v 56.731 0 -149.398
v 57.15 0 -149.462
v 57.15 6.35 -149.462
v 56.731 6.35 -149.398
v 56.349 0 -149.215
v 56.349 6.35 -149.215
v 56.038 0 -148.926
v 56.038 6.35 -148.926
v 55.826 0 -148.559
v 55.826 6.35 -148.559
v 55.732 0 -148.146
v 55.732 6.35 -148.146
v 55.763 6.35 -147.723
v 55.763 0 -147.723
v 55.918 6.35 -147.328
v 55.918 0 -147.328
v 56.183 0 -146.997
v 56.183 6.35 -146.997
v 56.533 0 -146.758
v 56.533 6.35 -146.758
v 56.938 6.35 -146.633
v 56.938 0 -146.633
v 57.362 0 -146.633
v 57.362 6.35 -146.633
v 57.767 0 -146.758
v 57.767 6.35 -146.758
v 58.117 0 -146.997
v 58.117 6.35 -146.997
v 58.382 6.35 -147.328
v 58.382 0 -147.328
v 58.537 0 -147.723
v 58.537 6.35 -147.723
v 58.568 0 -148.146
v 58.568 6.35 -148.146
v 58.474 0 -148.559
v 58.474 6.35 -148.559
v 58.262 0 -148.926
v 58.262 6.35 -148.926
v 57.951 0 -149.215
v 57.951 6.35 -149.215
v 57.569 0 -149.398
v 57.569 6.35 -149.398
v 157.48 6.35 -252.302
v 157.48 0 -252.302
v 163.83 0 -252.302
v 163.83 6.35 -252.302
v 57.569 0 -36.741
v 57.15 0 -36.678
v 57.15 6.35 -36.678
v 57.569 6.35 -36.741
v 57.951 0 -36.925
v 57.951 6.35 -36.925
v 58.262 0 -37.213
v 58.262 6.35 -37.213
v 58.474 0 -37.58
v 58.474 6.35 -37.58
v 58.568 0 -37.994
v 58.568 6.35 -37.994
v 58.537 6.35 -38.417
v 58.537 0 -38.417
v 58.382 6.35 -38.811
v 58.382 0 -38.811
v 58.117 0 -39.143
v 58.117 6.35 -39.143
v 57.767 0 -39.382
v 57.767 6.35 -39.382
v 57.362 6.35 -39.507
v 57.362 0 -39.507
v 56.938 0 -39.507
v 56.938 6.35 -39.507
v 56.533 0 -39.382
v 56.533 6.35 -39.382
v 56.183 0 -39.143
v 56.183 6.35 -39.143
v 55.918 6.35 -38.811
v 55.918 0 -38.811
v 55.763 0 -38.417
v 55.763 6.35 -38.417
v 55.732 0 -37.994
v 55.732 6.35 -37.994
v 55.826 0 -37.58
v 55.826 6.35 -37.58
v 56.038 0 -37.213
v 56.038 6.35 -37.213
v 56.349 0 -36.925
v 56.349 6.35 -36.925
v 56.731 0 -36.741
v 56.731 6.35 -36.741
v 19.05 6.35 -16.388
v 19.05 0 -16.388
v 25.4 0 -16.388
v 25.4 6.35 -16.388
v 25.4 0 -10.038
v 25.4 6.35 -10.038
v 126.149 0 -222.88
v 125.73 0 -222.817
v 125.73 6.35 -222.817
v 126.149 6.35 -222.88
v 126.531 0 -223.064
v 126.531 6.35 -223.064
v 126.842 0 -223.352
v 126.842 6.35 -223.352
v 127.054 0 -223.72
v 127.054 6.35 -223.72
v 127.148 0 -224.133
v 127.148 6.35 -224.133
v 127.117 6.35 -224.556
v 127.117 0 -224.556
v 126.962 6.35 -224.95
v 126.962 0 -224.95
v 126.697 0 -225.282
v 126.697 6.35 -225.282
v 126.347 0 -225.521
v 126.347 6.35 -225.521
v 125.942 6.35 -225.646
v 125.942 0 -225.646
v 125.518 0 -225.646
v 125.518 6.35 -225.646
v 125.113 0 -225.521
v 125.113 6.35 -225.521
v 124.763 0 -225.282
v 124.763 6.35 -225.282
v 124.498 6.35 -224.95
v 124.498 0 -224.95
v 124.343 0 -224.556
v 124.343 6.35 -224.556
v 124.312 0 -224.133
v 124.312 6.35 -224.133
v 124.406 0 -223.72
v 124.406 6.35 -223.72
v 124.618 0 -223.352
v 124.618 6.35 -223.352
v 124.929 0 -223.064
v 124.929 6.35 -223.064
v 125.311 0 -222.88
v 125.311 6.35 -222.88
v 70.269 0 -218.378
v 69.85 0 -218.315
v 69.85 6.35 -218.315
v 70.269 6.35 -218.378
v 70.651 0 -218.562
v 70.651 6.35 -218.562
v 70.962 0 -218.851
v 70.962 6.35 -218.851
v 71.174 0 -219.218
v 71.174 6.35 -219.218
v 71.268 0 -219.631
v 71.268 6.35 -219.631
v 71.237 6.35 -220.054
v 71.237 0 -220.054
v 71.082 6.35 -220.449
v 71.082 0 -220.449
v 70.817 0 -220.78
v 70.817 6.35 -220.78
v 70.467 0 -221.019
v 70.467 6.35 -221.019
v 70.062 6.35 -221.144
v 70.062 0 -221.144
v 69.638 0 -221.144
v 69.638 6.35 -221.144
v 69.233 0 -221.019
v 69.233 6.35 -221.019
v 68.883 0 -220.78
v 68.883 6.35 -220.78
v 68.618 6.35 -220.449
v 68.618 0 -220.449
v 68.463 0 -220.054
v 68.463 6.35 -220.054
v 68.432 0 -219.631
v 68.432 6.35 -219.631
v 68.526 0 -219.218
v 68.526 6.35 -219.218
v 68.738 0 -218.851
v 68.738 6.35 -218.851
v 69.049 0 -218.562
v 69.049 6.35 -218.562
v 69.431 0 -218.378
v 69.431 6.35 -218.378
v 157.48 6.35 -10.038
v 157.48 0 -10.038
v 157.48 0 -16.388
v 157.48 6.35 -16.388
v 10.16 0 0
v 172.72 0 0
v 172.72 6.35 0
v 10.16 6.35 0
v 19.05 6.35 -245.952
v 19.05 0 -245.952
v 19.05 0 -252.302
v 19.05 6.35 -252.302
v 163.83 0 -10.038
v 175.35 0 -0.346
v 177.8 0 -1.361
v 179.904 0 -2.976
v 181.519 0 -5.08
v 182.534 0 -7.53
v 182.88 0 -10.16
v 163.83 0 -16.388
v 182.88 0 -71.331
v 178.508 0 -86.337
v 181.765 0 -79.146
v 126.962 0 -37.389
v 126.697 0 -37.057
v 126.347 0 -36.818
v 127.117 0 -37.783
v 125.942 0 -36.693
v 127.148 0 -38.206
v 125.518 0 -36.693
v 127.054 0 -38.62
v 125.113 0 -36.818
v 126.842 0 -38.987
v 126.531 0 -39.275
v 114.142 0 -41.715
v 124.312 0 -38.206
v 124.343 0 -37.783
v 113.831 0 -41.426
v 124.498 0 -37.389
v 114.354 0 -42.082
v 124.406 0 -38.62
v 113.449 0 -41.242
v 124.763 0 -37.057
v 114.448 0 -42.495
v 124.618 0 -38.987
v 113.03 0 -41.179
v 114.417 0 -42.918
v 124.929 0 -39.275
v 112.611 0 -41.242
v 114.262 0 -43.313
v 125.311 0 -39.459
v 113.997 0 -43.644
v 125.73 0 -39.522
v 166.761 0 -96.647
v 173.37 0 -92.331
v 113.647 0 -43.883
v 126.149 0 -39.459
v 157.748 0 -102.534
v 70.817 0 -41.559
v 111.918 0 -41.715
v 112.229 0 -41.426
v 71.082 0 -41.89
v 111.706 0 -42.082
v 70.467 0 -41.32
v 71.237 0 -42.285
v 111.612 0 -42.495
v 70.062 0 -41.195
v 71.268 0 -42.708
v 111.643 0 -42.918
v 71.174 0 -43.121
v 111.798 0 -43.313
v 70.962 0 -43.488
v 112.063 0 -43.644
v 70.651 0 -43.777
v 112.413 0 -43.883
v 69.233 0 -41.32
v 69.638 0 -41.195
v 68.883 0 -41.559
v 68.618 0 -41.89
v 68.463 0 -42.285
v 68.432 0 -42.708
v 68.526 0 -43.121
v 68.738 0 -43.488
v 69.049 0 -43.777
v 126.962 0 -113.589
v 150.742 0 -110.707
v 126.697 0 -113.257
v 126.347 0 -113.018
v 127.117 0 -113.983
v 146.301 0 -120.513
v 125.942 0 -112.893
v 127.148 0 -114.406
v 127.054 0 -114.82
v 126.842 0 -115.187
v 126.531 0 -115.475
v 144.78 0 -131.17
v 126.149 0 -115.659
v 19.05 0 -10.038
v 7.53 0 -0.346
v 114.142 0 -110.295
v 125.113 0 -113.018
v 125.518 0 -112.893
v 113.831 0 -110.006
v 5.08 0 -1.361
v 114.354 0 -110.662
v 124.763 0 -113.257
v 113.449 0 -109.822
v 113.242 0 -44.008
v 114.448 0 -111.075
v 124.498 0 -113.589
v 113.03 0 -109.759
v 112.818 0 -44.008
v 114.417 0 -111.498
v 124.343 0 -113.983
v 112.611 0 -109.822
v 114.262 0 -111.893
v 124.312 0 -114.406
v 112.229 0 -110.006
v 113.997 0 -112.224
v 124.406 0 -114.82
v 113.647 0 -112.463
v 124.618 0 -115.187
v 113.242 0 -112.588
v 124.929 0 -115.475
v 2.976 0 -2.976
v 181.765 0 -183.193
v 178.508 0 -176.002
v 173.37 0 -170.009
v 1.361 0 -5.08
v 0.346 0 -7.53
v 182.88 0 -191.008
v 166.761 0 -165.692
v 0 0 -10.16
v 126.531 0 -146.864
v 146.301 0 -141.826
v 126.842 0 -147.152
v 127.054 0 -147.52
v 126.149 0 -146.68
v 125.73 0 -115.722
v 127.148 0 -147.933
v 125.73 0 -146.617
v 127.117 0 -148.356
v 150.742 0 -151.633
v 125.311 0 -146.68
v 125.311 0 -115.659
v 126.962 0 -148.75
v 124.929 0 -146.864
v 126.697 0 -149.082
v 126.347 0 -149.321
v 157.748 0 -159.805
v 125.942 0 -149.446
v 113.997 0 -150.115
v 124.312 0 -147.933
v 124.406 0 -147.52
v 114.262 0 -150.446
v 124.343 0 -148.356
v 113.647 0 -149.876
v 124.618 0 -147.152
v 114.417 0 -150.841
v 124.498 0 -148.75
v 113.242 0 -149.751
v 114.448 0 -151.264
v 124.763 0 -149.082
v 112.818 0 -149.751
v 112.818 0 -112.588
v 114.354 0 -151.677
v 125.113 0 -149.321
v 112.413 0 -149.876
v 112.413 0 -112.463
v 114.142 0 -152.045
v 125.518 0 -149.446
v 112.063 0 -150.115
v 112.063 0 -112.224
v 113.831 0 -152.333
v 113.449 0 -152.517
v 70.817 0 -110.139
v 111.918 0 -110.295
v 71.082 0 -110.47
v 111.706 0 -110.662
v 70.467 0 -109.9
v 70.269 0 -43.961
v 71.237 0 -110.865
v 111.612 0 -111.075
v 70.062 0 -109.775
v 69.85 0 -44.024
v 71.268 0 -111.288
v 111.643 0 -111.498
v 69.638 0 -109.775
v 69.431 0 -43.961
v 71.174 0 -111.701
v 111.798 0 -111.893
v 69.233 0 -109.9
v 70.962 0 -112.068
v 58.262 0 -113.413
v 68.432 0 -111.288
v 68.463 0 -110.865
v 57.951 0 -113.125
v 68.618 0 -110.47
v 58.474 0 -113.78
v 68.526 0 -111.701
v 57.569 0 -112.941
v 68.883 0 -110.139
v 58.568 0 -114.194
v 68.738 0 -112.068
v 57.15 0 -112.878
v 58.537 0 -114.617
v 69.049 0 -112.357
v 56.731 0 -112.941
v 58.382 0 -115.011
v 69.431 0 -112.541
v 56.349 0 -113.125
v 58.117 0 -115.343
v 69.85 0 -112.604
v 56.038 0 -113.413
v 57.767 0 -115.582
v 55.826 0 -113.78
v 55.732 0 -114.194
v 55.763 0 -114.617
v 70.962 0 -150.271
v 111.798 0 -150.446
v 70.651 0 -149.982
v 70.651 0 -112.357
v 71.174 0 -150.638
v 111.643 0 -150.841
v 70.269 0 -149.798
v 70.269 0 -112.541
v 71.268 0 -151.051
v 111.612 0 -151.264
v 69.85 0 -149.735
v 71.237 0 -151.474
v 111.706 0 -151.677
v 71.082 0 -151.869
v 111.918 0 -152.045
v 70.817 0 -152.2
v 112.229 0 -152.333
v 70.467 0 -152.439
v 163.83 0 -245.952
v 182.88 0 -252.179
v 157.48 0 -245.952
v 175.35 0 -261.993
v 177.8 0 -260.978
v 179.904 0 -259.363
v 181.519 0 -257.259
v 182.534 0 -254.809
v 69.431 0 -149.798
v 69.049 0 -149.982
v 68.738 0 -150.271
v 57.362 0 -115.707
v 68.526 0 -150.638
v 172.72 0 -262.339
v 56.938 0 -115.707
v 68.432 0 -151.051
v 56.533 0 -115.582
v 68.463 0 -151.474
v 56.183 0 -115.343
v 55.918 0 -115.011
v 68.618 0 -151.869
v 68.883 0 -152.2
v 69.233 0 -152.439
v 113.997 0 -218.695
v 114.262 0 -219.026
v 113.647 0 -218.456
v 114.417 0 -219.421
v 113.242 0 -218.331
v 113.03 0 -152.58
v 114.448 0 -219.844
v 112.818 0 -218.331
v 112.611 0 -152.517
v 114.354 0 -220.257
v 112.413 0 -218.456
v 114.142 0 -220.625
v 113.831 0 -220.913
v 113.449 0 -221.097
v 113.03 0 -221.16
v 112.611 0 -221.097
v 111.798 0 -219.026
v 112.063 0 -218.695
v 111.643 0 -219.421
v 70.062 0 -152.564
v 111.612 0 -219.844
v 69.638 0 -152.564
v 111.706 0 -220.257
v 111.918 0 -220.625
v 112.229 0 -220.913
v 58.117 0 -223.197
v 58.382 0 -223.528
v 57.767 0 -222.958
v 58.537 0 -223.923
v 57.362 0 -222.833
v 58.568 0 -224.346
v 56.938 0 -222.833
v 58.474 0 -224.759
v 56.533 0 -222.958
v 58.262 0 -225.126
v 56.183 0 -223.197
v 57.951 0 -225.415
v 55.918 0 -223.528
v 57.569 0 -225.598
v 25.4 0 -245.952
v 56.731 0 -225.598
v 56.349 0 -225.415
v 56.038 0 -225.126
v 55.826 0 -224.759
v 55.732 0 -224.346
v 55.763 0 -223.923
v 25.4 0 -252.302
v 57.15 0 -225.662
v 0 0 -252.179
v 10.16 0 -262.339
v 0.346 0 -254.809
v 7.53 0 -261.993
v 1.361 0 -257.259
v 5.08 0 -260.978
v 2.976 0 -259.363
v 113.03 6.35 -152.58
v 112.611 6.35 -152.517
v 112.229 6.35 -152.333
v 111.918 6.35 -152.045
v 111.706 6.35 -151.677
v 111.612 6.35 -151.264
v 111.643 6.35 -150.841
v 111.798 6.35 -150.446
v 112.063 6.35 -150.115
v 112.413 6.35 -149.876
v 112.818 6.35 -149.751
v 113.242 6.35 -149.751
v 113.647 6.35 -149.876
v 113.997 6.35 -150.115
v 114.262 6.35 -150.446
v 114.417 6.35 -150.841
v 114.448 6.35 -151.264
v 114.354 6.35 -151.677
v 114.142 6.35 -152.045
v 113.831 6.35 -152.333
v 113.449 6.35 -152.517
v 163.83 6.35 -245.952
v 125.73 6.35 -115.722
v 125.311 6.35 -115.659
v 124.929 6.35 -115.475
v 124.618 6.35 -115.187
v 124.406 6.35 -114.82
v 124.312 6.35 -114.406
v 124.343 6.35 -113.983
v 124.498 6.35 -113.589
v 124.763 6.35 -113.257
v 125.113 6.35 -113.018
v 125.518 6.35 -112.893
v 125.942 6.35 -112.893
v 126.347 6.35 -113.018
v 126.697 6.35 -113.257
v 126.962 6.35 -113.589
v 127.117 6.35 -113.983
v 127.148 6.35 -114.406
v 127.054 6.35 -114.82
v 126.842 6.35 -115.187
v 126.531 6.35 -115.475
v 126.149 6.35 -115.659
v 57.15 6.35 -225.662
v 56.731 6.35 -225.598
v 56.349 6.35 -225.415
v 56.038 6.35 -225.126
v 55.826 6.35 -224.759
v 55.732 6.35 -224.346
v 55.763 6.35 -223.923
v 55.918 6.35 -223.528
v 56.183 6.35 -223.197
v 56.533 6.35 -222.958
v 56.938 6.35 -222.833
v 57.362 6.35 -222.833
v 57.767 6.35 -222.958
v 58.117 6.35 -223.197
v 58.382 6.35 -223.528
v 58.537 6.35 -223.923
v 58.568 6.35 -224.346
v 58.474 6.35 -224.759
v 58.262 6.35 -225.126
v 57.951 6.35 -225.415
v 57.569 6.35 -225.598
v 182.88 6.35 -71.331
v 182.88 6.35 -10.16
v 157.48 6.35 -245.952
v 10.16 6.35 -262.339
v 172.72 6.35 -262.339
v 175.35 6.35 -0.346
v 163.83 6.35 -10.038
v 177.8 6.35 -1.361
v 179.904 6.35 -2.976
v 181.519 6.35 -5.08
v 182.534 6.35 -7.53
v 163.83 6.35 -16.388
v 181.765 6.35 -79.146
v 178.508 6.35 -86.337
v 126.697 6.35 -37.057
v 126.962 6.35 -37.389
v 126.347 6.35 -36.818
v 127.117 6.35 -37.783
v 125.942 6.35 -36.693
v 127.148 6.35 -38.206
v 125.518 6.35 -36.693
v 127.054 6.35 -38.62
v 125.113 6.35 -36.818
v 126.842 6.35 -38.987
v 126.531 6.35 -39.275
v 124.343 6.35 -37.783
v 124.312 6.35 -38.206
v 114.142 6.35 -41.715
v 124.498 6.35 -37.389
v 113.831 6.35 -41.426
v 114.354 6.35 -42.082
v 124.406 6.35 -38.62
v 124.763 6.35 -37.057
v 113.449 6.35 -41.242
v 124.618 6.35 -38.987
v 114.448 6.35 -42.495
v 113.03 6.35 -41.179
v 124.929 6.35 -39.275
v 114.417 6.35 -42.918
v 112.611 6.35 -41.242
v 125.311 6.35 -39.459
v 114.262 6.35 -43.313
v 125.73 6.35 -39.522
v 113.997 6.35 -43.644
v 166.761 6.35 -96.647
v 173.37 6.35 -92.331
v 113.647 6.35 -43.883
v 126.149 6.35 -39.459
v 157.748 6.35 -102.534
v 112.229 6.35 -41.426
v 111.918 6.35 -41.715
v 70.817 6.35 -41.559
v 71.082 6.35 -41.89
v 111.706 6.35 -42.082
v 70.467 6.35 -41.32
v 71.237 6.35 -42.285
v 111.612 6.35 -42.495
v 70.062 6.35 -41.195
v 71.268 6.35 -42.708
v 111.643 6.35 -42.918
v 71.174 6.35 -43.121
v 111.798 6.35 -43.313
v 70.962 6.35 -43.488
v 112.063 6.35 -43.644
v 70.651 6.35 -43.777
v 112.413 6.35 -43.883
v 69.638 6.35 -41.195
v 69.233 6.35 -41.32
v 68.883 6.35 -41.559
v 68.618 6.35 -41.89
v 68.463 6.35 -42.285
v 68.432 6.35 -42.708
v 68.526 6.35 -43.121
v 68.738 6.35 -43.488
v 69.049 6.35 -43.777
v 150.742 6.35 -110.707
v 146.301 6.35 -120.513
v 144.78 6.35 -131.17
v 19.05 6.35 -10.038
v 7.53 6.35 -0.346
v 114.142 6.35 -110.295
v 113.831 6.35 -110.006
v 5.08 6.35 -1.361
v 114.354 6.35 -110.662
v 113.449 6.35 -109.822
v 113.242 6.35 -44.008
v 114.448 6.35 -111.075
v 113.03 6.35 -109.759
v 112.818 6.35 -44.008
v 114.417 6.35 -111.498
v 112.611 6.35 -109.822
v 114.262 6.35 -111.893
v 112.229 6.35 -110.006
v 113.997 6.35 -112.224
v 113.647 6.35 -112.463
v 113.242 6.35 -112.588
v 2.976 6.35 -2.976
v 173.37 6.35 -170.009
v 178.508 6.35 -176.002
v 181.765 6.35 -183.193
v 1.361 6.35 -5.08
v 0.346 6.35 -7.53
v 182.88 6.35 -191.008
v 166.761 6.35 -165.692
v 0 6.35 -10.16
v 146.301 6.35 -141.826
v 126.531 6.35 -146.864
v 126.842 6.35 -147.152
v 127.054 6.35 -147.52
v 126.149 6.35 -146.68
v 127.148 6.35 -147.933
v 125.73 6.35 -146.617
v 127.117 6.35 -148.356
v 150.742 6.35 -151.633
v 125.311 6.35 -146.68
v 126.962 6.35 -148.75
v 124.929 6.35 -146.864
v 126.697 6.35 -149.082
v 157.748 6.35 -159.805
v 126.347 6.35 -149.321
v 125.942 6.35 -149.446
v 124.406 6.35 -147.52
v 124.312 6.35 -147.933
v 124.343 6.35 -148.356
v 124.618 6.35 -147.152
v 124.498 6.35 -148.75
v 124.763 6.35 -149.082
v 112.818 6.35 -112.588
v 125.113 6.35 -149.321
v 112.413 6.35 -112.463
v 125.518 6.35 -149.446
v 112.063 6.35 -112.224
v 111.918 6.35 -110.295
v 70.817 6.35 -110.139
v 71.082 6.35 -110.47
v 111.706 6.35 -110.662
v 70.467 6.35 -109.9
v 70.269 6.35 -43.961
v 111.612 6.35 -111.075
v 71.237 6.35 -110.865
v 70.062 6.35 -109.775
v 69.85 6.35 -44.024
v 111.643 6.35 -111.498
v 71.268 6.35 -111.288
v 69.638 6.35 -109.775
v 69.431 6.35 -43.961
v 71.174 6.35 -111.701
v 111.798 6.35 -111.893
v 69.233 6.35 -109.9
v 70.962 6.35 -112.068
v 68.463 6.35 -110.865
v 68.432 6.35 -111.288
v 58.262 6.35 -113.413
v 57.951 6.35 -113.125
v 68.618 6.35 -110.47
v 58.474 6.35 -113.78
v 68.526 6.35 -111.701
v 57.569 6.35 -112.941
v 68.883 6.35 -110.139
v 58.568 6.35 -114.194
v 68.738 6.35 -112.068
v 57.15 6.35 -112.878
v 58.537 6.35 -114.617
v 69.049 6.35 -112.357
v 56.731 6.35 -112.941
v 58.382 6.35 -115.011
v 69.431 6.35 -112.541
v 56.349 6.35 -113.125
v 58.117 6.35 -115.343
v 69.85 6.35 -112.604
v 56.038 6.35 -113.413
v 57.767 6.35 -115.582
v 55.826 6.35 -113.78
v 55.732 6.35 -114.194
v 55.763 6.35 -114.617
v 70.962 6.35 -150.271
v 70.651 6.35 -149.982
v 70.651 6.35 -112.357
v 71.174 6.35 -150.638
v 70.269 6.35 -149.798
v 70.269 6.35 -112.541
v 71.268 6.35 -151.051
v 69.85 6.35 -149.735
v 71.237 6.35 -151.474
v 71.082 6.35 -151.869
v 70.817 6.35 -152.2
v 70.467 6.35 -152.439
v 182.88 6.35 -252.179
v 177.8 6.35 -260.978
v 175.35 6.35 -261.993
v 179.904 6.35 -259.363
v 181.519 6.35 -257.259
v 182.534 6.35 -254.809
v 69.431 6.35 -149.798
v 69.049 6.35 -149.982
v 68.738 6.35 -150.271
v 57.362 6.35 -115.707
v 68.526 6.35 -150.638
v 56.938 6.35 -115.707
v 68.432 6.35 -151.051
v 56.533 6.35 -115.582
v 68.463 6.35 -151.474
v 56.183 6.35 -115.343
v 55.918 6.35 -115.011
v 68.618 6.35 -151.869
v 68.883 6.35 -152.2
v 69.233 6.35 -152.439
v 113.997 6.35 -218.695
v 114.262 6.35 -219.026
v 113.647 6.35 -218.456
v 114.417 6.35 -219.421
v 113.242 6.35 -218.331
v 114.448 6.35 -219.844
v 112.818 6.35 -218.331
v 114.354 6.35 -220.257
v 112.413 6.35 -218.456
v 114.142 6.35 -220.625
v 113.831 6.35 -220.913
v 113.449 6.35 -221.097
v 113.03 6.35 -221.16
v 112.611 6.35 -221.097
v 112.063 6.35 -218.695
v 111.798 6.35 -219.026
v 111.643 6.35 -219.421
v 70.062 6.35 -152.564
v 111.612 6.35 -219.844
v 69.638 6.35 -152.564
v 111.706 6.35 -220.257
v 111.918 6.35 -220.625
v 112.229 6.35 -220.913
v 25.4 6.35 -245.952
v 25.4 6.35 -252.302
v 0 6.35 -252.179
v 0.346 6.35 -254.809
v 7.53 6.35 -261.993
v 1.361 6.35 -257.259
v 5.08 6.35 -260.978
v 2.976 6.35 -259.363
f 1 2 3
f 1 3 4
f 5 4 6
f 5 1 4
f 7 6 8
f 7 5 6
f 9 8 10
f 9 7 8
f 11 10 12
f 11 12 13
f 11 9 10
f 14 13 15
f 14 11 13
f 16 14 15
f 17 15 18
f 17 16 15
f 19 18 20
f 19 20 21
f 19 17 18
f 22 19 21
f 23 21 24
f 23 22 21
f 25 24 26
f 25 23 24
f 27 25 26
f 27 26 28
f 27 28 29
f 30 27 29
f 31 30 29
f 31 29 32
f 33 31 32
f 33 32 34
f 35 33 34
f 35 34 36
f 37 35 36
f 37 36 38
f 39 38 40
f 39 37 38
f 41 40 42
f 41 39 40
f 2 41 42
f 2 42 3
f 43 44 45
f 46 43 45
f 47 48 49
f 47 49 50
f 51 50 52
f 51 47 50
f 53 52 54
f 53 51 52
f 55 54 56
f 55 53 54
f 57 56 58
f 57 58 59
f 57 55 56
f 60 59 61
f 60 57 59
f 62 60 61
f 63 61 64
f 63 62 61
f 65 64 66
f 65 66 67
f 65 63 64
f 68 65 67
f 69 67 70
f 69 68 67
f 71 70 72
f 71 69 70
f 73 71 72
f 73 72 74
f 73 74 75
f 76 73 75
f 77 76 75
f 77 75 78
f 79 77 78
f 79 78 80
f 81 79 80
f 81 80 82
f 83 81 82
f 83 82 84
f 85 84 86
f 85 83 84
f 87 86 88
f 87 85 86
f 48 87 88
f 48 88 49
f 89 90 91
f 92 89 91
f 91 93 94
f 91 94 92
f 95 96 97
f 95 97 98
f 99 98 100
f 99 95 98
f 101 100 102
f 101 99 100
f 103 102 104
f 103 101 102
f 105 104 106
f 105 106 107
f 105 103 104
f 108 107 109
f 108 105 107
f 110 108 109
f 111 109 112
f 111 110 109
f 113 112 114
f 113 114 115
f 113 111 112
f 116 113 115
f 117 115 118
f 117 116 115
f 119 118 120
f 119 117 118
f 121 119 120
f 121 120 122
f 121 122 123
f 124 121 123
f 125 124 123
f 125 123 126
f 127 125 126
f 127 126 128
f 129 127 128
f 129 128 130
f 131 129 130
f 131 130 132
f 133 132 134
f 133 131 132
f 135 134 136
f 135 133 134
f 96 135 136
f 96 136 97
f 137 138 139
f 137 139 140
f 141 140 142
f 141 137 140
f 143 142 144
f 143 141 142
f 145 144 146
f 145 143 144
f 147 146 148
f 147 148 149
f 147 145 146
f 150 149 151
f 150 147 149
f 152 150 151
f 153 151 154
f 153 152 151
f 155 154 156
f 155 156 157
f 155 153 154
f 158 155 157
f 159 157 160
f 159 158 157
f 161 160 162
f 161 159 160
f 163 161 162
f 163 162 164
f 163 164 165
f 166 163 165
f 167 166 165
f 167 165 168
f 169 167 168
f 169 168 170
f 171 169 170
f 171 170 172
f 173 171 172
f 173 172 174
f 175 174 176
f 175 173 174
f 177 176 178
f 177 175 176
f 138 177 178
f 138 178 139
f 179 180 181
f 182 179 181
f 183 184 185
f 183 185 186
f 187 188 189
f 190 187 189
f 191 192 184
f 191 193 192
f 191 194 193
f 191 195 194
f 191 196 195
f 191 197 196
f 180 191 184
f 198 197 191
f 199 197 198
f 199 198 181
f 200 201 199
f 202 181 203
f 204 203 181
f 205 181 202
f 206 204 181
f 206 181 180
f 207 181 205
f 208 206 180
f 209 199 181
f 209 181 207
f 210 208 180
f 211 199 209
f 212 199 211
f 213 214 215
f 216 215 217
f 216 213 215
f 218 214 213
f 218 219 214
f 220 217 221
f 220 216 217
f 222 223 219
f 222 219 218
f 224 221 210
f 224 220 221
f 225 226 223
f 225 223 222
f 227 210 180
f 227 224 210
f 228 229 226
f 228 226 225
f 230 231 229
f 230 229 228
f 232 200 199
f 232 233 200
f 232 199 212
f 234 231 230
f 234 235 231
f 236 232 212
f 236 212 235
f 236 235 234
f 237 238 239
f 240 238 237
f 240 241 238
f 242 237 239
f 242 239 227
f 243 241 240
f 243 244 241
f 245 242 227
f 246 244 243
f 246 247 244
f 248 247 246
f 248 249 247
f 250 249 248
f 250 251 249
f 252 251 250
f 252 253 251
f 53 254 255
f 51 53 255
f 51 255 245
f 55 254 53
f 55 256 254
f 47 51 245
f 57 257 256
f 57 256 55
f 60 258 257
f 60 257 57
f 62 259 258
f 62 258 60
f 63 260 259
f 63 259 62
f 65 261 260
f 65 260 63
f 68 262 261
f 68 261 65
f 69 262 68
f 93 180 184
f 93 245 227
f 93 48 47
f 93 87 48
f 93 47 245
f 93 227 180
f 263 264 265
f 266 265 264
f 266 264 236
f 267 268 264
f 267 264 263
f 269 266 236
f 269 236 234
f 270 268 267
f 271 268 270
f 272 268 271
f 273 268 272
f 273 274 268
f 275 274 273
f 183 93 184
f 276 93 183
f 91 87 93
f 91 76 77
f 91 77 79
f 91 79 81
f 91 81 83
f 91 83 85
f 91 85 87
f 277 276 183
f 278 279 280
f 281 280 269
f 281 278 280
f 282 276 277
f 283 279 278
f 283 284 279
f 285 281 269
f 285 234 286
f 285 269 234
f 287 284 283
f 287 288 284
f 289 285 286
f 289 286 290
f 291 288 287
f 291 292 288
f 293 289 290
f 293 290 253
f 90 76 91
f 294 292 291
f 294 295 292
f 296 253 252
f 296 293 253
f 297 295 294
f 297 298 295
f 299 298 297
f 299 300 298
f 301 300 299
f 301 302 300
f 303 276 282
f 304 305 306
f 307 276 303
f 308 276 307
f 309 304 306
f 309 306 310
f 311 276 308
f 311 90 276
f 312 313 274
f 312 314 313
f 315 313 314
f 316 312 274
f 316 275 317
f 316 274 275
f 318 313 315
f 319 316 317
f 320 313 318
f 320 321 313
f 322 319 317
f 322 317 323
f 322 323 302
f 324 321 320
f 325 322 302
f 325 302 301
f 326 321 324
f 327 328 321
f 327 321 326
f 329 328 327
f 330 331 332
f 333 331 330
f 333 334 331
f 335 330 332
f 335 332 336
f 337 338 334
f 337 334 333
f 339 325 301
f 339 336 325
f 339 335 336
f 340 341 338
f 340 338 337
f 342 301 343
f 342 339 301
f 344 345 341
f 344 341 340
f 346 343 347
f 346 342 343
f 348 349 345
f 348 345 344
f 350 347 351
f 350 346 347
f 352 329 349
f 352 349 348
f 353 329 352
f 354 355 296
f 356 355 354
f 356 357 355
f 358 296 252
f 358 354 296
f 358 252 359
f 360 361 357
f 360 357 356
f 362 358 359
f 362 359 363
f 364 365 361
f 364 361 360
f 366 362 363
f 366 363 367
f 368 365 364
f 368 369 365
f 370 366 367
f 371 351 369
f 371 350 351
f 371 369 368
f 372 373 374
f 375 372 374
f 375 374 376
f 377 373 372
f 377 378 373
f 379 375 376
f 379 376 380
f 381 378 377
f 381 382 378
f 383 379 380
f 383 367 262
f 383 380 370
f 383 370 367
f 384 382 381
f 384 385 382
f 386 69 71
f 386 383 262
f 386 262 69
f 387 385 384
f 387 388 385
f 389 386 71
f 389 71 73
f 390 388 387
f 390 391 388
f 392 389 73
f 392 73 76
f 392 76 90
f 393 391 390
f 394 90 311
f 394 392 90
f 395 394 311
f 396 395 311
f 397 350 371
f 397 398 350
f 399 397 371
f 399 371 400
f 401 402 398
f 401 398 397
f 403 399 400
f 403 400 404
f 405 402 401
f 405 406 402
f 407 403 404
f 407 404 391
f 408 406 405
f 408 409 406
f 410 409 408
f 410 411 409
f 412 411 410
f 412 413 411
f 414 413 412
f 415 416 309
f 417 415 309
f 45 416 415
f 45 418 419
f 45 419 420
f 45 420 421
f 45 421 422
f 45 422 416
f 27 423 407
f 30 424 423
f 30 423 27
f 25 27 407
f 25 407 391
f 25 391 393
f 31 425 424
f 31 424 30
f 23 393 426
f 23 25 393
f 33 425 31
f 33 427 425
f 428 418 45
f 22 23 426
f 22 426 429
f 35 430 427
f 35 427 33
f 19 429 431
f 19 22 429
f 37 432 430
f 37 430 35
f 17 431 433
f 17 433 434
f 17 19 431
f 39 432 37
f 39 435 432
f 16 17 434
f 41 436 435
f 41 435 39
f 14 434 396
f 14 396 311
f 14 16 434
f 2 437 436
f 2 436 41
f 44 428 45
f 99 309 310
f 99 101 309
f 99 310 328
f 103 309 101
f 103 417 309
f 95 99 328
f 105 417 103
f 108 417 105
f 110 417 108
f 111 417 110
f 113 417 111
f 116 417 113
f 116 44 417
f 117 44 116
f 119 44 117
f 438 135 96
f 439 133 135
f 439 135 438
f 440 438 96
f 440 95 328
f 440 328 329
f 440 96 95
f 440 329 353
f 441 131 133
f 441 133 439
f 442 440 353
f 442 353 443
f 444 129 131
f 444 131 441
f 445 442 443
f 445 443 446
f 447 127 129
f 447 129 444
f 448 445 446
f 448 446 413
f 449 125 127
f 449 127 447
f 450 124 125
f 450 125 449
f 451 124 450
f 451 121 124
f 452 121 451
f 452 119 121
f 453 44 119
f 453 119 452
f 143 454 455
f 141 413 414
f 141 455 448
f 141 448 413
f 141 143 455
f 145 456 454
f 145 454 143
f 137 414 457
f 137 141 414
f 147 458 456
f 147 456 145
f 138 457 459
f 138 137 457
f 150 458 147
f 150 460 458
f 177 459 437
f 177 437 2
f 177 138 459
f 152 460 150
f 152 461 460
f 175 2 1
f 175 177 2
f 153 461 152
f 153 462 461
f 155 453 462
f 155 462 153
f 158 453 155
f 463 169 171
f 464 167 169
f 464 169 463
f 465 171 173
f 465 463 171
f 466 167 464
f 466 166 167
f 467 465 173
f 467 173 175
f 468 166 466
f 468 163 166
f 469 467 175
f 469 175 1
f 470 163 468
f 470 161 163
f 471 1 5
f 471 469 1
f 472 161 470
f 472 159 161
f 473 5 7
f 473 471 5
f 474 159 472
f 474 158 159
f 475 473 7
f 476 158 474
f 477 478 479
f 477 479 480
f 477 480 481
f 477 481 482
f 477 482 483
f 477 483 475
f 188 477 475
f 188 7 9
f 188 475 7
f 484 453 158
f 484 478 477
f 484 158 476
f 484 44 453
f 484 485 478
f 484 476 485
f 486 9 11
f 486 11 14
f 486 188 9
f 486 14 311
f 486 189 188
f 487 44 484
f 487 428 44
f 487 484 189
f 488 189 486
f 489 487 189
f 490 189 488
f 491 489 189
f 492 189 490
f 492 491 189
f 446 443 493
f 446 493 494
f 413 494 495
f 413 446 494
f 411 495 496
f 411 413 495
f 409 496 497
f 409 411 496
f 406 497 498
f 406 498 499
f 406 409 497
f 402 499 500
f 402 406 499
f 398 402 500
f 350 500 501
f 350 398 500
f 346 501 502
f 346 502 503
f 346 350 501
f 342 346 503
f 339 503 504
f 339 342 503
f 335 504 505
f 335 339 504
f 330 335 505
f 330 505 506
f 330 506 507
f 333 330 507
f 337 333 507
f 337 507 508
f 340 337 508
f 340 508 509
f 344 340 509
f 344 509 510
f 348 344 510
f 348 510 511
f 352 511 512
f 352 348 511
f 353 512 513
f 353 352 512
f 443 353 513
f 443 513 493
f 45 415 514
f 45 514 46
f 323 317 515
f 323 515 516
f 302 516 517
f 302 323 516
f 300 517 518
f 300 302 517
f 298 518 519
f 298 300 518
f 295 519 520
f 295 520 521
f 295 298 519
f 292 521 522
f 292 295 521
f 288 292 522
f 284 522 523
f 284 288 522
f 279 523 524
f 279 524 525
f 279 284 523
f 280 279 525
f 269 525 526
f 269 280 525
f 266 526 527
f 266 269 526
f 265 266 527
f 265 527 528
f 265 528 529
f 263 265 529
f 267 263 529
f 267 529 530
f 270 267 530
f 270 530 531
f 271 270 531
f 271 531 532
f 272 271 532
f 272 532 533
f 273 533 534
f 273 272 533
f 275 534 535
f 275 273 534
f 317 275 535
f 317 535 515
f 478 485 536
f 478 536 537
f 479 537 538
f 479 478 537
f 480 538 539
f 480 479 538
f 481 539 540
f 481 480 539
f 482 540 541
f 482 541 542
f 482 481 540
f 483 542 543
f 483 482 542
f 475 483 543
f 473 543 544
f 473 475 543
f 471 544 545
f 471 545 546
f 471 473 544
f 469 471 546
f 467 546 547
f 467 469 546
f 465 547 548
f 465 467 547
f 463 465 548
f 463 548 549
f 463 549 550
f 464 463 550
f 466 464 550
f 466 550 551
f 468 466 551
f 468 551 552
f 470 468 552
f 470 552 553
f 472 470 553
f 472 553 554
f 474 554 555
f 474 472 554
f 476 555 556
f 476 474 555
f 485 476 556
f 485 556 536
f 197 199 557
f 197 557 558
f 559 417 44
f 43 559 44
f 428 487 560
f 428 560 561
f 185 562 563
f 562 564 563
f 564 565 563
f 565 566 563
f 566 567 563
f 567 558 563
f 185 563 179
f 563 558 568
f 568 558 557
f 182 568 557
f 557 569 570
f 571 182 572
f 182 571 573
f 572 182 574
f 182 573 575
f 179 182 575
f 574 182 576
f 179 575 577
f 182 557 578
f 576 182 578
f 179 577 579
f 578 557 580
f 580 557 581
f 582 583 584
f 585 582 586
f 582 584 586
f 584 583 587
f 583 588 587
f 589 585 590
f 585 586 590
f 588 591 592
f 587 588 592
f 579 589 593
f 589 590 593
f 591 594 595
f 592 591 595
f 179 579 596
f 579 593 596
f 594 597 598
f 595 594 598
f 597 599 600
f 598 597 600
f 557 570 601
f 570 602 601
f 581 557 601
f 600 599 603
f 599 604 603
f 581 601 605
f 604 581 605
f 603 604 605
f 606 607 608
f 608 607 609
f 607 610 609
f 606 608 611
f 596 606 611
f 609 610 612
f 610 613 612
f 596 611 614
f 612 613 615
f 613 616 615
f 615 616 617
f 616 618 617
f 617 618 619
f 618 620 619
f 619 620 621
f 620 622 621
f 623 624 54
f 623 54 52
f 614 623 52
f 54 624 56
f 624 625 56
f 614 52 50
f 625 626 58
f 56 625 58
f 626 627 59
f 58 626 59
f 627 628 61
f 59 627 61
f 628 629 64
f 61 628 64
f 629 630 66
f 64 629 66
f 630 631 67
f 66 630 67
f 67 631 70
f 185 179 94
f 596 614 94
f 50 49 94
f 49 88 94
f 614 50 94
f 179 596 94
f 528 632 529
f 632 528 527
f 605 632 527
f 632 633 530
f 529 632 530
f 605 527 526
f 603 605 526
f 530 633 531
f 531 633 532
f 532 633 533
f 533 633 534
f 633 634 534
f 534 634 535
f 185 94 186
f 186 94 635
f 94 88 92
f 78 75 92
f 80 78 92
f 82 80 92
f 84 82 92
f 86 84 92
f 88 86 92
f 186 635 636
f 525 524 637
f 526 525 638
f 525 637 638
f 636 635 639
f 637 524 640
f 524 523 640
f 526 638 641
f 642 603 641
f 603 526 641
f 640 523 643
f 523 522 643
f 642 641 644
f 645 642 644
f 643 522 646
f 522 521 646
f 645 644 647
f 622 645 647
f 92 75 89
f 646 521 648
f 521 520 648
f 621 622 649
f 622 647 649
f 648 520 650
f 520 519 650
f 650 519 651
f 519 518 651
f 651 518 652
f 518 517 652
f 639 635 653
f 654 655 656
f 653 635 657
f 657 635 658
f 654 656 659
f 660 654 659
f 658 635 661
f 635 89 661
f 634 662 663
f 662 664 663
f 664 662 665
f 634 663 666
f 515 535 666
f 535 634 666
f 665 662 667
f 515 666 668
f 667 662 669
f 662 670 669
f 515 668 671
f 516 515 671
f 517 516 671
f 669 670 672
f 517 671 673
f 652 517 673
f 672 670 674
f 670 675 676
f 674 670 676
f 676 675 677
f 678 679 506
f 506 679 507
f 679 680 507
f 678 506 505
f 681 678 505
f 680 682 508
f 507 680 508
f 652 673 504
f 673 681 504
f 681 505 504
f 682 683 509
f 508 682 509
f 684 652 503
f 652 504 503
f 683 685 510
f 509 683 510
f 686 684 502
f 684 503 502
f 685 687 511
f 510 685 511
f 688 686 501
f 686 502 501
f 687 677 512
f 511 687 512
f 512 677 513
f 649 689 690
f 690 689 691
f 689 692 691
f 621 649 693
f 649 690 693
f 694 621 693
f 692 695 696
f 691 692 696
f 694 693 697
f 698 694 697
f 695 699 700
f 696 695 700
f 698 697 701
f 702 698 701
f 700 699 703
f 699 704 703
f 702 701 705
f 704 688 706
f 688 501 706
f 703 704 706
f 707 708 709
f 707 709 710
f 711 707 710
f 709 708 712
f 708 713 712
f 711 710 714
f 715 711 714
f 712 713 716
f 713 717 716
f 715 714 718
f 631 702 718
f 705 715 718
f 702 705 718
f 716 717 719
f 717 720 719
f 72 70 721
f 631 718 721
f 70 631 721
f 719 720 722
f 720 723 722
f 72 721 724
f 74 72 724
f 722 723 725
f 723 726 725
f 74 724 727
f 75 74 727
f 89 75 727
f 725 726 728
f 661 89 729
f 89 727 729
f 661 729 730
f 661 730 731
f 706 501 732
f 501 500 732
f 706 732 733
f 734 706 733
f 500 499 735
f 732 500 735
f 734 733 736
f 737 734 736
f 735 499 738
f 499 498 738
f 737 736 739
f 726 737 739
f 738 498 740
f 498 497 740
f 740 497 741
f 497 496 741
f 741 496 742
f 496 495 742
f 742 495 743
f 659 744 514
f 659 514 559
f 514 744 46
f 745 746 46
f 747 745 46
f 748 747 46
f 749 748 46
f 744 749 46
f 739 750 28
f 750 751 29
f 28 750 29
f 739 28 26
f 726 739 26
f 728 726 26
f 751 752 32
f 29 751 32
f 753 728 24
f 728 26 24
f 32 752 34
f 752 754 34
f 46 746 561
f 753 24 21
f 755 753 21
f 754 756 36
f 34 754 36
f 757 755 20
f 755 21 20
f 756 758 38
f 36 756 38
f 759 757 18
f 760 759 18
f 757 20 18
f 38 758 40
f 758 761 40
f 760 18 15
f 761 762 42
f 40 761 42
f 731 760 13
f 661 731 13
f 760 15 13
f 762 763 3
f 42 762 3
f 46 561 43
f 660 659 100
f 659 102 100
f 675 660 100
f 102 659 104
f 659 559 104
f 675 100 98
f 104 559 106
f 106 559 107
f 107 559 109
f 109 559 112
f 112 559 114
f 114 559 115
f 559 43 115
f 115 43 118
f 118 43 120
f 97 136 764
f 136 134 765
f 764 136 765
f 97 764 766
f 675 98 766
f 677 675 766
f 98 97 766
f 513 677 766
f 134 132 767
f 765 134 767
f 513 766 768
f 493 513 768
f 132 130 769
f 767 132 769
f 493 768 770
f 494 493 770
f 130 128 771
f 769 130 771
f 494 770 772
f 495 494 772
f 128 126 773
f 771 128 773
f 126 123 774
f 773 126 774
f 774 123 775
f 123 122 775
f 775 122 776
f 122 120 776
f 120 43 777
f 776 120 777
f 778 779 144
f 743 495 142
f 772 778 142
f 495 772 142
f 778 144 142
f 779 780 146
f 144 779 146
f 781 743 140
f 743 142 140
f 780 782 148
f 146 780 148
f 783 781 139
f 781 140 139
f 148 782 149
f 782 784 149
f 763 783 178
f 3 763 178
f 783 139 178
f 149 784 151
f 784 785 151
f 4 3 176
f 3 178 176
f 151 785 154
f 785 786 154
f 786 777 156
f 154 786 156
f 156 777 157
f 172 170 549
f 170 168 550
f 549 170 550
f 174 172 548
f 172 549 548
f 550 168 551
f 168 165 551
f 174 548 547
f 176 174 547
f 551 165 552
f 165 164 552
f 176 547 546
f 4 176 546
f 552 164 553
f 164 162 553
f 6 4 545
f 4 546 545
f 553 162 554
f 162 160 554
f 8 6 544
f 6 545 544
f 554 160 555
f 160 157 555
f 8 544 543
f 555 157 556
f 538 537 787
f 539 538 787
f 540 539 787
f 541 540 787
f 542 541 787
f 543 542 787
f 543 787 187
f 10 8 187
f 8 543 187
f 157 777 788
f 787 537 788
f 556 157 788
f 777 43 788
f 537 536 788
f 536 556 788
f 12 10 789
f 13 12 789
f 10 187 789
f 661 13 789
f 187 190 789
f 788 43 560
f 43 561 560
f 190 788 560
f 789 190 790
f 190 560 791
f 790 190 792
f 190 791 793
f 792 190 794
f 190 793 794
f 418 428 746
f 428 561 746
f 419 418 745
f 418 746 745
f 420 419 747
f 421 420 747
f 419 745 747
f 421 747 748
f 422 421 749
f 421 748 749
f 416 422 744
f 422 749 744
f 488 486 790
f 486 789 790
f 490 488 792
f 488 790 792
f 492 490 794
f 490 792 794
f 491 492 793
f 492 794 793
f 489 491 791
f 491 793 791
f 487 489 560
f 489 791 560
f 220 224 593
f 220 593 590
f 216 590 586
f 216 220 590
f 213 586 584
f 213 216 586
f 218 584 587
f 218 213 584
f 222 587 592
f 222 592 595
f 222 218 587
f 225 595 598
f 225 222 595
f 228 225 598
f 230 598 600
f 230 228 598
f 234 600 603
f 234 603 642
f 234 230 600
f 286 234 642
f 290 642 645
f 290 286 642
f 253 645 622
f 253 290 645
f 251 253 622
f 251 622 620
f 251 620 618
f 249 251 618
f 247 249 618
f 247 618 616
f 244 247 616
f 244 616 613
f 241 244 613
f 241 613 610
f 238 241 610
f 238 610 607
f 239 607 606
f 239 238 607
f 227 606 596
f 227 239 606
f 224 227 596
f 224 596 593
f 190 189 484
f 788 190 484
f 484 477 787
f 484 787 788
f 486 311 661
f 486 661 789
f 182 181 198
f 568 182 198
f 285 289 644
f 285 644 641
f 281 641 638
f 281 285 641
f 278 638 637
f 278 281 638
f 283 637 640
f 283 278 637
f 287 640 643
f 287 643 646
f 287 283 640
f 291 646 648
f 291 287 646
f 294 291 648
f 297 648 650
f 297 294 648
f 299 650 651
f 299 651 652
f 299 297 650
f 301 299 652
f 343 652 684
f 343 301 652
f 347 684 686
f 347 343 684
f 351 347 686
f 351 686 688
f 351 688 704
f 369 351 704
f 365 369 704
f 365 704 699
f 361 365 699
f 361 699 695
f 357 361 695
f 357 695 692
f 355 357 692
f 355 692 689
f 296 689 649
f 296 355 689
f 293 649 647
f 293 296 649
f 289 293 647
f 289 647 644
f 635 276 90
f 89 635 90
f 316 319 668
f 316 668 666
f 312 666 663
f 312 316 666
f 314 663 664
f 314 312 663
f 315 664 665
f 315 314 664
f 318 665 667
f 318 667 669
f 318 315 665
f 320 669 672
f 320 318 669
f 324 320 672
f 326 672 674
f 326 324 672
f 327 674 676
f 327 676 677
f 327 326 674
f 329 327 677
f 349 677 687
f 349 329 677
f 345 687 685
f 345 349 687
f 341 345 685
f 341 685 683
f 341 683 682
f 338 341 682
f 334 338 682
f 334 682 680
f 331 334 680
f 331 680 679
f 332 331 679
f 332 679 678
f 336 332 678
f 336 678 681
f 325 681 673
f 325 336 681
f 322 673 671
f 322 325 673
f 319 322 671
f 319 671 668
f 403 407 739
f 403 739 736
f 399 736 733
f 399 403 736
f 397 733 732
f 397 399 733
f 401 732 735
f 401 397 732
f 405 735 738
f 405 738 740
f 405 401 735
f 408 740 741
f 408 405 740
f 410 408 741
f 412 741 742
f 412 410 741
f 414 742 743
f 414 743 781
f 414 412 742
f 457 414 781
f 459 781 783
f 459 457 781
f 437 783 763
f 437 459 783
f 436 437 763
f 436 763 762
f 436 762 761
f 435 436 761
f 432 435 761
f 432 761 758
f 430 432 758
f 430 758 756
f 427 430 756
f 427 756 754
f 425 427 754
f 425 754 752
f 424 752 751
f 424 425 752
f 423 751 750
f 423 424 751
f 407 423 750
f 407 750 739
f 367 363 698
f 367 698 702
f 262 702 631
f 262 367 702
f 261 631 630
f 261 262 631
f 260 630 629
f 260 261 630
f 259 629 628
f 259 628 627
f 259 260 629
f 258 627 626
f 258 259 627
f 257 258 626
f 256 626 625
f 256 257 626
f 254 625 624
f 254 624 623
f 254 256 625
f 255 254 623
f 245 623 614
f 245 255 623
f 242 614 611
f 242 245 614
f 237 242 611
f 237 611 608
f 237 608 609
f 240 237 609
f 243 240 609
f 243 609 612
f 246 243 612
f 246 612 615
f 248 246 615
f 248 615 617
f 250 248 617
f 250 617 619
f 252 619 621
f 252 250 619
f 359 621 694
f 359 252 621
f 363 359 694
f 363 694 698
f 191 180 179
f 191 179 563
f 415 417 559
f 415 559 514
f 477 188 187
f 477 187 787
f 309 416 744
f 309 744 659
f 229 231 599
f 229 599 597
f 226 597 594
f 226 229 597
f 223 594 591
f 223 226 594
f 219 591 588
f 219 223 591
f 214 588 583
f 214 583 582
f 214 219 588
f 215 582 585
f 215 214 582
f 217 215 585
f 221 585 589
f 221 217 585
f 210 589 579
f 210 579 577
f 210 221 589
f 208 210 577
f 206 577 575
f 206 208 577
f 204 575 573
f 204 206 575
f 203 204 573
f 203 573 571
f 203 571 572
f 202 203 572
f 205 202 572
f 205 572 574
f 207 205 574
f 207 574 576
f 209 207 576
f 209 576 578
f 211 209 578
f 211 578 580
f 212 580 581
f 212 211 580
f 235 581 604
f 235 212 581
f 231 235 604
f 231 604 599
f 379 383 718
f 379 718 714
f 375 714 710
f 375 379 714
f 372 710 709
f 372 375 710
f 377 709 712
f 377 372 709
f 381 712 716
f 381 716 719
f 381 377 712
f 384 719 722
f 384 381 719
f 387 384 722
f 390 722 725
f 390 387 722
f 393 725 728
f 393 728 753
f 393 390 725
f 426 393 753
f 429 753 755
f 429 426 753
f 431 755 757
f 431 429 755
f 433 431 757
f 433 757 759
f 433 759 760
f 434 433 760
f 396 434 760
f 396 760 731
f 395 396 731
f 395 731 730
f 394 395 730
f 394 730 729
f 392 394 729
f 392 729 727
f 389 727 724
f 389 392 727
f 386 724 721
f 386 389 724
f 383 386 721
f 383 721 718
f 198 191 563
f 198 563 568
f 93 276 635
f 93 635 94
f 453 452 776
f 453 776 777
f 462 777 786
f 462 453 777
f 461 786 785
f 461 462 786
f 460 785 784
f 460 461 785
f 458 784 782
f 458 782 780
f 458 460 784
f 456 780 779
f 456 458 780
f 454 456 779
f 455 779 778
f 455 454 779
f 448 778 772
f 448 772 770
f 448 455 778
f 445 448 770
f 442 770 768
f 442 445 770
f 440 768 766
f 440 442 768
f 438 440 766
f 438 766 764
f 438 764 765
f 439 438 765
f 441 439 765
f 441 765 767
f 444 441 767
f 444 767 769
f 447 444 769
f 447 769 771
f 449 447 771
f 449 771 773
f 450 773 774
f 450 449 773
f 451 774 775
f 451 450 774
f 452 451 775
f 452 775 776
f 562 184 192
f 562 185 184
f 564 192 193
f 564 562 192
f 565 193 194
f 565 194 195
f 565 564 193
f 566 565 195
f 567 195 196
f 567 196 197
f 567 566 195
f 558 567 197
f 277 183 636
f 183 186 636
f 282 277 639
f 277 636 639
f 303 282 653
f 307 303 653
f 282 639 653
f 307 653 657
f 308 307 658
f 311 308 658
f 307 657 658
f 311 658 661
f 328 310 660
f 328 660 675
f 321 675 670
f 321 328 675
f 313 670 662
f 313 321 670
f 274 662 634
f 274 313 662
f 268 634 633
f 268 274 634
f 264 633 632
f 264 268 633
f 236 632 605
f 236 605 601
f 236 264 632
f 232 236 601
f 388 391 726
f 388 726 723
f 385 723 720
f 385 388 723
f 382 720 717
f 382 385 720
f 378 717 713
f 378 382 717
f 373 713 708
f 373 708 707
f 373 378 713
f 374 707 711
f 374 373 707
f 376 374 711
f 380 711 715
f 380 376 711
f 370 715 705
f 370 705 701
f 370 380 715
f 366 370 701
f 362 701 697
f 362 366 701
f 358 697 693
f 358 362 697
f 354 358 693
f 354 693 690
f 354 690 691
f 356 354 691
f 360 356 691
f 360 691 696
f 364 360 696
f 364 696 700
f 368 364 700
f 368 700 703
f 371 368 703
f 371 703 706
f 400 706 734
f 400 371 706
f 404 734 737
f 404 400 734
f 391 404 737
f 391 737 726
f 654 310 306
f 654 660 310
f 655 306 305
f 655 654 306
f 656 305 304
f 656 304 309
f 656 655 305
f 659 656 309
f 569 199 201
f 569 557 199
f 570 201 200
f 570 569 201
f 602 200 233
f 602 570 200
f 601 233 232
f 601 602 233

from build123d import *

# Parameters (mm, degrees)
SKETCH3_R           = 1.4224
SKETCH3_W           = 6.35
SKETCH3_H           = 6.35
BOSS_EXTRUDE1_DEPTH = 6.35
FILLET1_R           = 10.16
FILLET2_R           = 27.94


with BuildPart() as part:
    # Sketch3 → Boss-Extrude1 (new body)
    with BuildSketch(Plane(origin=(0, 0, 0), x_dir=(1, 0, 0), z_dir=(0, 1, 0))):
        with BuildLine():
            Line((182.88, 0), (0, 0))
            Line((0, 0), (0, 262.339276313))
            Line((0, 262.339276313), (182.88, 262.339276313))
            Line((182.88, 262.339276313), (182.88, 169.269638157))
            ThreePointArc((182.88, 169.269638157), (144.78, 131.169638157), (182.88, 93.069638157))
            Line((182.88, 93.069638157), (182.88, 0))
        make_face()
        with Locations(Location((57.15, 38.1, 0), (0, 0, 270))):
            Circle(SKETCH3_R, mode=Mode.SUBTRACT)
        with Locations(Location((57.15, 114.3, 0), (0, 0, 270))):
            Circle(SKETCH3_R, mode=Mode.SUBTRACT)
        with Locations(Location((125.73, 114.3, 0), (0, 0, 90))):
            Circle(SKETCH3_R, mode=Mode.SUBTRACT)
        with Locations(Location((125.73, 38.1, 0), (0, 0, 90))):
            Circle(SKETCH3_R, mode=Mode.SUBTRACT)
        with Locations(Location((69.85, 151.157668748, 0), (0, 0, 270))):
            Circle(SKETCH3_R, mode=Mode.SUBTRACT)
        with Locations(Location((69.85, 219.737668748, 0), (0, 0, 270))):
            Circle(SKETCH3_R, mode=Mode.SUBTRACT)
        with Locations(Location((113.03, 151.157668748, 0), (0, 0, 90))):
            Circle(SKETCH3_R, mode=Mode.SUBTRACT)
        with Locations(Location((113.03, 219.737668748, 0), (0, 0, 90))):
            Circle(SKETCH3_R, mode=Mode.SUBTRACT)
        with Locations(Location((113.03, 42.601607565, 0), (0, 0, 270))):
            Circle(SKETCH3_R, mode=Mode.SUBTRACT)
        with Locations(Location((113.03, 111.181607565, 0), (0, 0, 270))):
            Circle(SKETCH3_R, mode=Mode.SUBTRACT)
        with Locations(Location((69.85, 111.181607565, 0), (0, 0, 90))):
            Circle(SKETCH3_R, mode=Mode.SUBTRACT)
        with Locations(Location((69.85, 42.601607565, 0), (0, 0, 90))):
            Circle(SKETCH3_R, mode=Mode.SUBTRACT)
        with Locations(Location((125.73, 148.039276313, 0), (0, 0, 270))):
            Circle(SKETCH3_R, mode=Mode.SUBTRACT)
        with Locations(Location((125.73, 224.239276313, 0), (0, 0, 270))):
            Circle(SKETCH3_R, mode=Mode.SUBTRACT)
        with Locations(Location((57.15, 224.239276313, 0), (0, 0, 90))):
            Circle(SKETCH3_R, mode=Mode.SUBTRACT)
        with Locations(Location((57.15, 148.039276313, 0), (0, 0, 90))):
            Circle(SKETCH3_R, mode=Mode.SUBTRACT)
        with Locations((22.225, 13.212735966)):
            Rectangle(SKETCH3_W, SKETCH3_H, mode=Mode.SUBTRACT)
        with Locations((160.655, 13.212735966)):
            Rectangle(SKETCH3_W, SKETCH3_H, mode=Mode.SUBTRACT)
        with Locations((160.655, 249.126540348)):
            Rectangle(SKETCH3_W, SKETCH3_H, mode=Mode.SUBTRACT)
        with Locations((22.225, 249.126540348)):
            Rectangle(SKETCH3_W, SKETCH3_H, mode=Mode.SUBTRACT)
    extrude(amount=BOSS_EXTRUDE1_DEPTH)

    # Fillet1
    fillet1_edges = [part.edges().sort_by_distance(p)[0] for p in [
        (0, 3.175, -262.339276313),
        (182.88, 3.175, -262.339276313),
        (182.88, 3.175, 0),
        (0, 3.175, 0),
    ]]
    fillet(fillet1_edges, radius=FILLET1_R)

    # Fillet2
    fillet2_edges = [part.edges().sort_by_distance(p)[0] for p in [
        (182.88, 3.175, -169.269638157),
        (182.88, 3.175, -93.069638157),
    ]]
    fillet(fillet2_edges, radius=FILLET2_R)


solid = part.part
